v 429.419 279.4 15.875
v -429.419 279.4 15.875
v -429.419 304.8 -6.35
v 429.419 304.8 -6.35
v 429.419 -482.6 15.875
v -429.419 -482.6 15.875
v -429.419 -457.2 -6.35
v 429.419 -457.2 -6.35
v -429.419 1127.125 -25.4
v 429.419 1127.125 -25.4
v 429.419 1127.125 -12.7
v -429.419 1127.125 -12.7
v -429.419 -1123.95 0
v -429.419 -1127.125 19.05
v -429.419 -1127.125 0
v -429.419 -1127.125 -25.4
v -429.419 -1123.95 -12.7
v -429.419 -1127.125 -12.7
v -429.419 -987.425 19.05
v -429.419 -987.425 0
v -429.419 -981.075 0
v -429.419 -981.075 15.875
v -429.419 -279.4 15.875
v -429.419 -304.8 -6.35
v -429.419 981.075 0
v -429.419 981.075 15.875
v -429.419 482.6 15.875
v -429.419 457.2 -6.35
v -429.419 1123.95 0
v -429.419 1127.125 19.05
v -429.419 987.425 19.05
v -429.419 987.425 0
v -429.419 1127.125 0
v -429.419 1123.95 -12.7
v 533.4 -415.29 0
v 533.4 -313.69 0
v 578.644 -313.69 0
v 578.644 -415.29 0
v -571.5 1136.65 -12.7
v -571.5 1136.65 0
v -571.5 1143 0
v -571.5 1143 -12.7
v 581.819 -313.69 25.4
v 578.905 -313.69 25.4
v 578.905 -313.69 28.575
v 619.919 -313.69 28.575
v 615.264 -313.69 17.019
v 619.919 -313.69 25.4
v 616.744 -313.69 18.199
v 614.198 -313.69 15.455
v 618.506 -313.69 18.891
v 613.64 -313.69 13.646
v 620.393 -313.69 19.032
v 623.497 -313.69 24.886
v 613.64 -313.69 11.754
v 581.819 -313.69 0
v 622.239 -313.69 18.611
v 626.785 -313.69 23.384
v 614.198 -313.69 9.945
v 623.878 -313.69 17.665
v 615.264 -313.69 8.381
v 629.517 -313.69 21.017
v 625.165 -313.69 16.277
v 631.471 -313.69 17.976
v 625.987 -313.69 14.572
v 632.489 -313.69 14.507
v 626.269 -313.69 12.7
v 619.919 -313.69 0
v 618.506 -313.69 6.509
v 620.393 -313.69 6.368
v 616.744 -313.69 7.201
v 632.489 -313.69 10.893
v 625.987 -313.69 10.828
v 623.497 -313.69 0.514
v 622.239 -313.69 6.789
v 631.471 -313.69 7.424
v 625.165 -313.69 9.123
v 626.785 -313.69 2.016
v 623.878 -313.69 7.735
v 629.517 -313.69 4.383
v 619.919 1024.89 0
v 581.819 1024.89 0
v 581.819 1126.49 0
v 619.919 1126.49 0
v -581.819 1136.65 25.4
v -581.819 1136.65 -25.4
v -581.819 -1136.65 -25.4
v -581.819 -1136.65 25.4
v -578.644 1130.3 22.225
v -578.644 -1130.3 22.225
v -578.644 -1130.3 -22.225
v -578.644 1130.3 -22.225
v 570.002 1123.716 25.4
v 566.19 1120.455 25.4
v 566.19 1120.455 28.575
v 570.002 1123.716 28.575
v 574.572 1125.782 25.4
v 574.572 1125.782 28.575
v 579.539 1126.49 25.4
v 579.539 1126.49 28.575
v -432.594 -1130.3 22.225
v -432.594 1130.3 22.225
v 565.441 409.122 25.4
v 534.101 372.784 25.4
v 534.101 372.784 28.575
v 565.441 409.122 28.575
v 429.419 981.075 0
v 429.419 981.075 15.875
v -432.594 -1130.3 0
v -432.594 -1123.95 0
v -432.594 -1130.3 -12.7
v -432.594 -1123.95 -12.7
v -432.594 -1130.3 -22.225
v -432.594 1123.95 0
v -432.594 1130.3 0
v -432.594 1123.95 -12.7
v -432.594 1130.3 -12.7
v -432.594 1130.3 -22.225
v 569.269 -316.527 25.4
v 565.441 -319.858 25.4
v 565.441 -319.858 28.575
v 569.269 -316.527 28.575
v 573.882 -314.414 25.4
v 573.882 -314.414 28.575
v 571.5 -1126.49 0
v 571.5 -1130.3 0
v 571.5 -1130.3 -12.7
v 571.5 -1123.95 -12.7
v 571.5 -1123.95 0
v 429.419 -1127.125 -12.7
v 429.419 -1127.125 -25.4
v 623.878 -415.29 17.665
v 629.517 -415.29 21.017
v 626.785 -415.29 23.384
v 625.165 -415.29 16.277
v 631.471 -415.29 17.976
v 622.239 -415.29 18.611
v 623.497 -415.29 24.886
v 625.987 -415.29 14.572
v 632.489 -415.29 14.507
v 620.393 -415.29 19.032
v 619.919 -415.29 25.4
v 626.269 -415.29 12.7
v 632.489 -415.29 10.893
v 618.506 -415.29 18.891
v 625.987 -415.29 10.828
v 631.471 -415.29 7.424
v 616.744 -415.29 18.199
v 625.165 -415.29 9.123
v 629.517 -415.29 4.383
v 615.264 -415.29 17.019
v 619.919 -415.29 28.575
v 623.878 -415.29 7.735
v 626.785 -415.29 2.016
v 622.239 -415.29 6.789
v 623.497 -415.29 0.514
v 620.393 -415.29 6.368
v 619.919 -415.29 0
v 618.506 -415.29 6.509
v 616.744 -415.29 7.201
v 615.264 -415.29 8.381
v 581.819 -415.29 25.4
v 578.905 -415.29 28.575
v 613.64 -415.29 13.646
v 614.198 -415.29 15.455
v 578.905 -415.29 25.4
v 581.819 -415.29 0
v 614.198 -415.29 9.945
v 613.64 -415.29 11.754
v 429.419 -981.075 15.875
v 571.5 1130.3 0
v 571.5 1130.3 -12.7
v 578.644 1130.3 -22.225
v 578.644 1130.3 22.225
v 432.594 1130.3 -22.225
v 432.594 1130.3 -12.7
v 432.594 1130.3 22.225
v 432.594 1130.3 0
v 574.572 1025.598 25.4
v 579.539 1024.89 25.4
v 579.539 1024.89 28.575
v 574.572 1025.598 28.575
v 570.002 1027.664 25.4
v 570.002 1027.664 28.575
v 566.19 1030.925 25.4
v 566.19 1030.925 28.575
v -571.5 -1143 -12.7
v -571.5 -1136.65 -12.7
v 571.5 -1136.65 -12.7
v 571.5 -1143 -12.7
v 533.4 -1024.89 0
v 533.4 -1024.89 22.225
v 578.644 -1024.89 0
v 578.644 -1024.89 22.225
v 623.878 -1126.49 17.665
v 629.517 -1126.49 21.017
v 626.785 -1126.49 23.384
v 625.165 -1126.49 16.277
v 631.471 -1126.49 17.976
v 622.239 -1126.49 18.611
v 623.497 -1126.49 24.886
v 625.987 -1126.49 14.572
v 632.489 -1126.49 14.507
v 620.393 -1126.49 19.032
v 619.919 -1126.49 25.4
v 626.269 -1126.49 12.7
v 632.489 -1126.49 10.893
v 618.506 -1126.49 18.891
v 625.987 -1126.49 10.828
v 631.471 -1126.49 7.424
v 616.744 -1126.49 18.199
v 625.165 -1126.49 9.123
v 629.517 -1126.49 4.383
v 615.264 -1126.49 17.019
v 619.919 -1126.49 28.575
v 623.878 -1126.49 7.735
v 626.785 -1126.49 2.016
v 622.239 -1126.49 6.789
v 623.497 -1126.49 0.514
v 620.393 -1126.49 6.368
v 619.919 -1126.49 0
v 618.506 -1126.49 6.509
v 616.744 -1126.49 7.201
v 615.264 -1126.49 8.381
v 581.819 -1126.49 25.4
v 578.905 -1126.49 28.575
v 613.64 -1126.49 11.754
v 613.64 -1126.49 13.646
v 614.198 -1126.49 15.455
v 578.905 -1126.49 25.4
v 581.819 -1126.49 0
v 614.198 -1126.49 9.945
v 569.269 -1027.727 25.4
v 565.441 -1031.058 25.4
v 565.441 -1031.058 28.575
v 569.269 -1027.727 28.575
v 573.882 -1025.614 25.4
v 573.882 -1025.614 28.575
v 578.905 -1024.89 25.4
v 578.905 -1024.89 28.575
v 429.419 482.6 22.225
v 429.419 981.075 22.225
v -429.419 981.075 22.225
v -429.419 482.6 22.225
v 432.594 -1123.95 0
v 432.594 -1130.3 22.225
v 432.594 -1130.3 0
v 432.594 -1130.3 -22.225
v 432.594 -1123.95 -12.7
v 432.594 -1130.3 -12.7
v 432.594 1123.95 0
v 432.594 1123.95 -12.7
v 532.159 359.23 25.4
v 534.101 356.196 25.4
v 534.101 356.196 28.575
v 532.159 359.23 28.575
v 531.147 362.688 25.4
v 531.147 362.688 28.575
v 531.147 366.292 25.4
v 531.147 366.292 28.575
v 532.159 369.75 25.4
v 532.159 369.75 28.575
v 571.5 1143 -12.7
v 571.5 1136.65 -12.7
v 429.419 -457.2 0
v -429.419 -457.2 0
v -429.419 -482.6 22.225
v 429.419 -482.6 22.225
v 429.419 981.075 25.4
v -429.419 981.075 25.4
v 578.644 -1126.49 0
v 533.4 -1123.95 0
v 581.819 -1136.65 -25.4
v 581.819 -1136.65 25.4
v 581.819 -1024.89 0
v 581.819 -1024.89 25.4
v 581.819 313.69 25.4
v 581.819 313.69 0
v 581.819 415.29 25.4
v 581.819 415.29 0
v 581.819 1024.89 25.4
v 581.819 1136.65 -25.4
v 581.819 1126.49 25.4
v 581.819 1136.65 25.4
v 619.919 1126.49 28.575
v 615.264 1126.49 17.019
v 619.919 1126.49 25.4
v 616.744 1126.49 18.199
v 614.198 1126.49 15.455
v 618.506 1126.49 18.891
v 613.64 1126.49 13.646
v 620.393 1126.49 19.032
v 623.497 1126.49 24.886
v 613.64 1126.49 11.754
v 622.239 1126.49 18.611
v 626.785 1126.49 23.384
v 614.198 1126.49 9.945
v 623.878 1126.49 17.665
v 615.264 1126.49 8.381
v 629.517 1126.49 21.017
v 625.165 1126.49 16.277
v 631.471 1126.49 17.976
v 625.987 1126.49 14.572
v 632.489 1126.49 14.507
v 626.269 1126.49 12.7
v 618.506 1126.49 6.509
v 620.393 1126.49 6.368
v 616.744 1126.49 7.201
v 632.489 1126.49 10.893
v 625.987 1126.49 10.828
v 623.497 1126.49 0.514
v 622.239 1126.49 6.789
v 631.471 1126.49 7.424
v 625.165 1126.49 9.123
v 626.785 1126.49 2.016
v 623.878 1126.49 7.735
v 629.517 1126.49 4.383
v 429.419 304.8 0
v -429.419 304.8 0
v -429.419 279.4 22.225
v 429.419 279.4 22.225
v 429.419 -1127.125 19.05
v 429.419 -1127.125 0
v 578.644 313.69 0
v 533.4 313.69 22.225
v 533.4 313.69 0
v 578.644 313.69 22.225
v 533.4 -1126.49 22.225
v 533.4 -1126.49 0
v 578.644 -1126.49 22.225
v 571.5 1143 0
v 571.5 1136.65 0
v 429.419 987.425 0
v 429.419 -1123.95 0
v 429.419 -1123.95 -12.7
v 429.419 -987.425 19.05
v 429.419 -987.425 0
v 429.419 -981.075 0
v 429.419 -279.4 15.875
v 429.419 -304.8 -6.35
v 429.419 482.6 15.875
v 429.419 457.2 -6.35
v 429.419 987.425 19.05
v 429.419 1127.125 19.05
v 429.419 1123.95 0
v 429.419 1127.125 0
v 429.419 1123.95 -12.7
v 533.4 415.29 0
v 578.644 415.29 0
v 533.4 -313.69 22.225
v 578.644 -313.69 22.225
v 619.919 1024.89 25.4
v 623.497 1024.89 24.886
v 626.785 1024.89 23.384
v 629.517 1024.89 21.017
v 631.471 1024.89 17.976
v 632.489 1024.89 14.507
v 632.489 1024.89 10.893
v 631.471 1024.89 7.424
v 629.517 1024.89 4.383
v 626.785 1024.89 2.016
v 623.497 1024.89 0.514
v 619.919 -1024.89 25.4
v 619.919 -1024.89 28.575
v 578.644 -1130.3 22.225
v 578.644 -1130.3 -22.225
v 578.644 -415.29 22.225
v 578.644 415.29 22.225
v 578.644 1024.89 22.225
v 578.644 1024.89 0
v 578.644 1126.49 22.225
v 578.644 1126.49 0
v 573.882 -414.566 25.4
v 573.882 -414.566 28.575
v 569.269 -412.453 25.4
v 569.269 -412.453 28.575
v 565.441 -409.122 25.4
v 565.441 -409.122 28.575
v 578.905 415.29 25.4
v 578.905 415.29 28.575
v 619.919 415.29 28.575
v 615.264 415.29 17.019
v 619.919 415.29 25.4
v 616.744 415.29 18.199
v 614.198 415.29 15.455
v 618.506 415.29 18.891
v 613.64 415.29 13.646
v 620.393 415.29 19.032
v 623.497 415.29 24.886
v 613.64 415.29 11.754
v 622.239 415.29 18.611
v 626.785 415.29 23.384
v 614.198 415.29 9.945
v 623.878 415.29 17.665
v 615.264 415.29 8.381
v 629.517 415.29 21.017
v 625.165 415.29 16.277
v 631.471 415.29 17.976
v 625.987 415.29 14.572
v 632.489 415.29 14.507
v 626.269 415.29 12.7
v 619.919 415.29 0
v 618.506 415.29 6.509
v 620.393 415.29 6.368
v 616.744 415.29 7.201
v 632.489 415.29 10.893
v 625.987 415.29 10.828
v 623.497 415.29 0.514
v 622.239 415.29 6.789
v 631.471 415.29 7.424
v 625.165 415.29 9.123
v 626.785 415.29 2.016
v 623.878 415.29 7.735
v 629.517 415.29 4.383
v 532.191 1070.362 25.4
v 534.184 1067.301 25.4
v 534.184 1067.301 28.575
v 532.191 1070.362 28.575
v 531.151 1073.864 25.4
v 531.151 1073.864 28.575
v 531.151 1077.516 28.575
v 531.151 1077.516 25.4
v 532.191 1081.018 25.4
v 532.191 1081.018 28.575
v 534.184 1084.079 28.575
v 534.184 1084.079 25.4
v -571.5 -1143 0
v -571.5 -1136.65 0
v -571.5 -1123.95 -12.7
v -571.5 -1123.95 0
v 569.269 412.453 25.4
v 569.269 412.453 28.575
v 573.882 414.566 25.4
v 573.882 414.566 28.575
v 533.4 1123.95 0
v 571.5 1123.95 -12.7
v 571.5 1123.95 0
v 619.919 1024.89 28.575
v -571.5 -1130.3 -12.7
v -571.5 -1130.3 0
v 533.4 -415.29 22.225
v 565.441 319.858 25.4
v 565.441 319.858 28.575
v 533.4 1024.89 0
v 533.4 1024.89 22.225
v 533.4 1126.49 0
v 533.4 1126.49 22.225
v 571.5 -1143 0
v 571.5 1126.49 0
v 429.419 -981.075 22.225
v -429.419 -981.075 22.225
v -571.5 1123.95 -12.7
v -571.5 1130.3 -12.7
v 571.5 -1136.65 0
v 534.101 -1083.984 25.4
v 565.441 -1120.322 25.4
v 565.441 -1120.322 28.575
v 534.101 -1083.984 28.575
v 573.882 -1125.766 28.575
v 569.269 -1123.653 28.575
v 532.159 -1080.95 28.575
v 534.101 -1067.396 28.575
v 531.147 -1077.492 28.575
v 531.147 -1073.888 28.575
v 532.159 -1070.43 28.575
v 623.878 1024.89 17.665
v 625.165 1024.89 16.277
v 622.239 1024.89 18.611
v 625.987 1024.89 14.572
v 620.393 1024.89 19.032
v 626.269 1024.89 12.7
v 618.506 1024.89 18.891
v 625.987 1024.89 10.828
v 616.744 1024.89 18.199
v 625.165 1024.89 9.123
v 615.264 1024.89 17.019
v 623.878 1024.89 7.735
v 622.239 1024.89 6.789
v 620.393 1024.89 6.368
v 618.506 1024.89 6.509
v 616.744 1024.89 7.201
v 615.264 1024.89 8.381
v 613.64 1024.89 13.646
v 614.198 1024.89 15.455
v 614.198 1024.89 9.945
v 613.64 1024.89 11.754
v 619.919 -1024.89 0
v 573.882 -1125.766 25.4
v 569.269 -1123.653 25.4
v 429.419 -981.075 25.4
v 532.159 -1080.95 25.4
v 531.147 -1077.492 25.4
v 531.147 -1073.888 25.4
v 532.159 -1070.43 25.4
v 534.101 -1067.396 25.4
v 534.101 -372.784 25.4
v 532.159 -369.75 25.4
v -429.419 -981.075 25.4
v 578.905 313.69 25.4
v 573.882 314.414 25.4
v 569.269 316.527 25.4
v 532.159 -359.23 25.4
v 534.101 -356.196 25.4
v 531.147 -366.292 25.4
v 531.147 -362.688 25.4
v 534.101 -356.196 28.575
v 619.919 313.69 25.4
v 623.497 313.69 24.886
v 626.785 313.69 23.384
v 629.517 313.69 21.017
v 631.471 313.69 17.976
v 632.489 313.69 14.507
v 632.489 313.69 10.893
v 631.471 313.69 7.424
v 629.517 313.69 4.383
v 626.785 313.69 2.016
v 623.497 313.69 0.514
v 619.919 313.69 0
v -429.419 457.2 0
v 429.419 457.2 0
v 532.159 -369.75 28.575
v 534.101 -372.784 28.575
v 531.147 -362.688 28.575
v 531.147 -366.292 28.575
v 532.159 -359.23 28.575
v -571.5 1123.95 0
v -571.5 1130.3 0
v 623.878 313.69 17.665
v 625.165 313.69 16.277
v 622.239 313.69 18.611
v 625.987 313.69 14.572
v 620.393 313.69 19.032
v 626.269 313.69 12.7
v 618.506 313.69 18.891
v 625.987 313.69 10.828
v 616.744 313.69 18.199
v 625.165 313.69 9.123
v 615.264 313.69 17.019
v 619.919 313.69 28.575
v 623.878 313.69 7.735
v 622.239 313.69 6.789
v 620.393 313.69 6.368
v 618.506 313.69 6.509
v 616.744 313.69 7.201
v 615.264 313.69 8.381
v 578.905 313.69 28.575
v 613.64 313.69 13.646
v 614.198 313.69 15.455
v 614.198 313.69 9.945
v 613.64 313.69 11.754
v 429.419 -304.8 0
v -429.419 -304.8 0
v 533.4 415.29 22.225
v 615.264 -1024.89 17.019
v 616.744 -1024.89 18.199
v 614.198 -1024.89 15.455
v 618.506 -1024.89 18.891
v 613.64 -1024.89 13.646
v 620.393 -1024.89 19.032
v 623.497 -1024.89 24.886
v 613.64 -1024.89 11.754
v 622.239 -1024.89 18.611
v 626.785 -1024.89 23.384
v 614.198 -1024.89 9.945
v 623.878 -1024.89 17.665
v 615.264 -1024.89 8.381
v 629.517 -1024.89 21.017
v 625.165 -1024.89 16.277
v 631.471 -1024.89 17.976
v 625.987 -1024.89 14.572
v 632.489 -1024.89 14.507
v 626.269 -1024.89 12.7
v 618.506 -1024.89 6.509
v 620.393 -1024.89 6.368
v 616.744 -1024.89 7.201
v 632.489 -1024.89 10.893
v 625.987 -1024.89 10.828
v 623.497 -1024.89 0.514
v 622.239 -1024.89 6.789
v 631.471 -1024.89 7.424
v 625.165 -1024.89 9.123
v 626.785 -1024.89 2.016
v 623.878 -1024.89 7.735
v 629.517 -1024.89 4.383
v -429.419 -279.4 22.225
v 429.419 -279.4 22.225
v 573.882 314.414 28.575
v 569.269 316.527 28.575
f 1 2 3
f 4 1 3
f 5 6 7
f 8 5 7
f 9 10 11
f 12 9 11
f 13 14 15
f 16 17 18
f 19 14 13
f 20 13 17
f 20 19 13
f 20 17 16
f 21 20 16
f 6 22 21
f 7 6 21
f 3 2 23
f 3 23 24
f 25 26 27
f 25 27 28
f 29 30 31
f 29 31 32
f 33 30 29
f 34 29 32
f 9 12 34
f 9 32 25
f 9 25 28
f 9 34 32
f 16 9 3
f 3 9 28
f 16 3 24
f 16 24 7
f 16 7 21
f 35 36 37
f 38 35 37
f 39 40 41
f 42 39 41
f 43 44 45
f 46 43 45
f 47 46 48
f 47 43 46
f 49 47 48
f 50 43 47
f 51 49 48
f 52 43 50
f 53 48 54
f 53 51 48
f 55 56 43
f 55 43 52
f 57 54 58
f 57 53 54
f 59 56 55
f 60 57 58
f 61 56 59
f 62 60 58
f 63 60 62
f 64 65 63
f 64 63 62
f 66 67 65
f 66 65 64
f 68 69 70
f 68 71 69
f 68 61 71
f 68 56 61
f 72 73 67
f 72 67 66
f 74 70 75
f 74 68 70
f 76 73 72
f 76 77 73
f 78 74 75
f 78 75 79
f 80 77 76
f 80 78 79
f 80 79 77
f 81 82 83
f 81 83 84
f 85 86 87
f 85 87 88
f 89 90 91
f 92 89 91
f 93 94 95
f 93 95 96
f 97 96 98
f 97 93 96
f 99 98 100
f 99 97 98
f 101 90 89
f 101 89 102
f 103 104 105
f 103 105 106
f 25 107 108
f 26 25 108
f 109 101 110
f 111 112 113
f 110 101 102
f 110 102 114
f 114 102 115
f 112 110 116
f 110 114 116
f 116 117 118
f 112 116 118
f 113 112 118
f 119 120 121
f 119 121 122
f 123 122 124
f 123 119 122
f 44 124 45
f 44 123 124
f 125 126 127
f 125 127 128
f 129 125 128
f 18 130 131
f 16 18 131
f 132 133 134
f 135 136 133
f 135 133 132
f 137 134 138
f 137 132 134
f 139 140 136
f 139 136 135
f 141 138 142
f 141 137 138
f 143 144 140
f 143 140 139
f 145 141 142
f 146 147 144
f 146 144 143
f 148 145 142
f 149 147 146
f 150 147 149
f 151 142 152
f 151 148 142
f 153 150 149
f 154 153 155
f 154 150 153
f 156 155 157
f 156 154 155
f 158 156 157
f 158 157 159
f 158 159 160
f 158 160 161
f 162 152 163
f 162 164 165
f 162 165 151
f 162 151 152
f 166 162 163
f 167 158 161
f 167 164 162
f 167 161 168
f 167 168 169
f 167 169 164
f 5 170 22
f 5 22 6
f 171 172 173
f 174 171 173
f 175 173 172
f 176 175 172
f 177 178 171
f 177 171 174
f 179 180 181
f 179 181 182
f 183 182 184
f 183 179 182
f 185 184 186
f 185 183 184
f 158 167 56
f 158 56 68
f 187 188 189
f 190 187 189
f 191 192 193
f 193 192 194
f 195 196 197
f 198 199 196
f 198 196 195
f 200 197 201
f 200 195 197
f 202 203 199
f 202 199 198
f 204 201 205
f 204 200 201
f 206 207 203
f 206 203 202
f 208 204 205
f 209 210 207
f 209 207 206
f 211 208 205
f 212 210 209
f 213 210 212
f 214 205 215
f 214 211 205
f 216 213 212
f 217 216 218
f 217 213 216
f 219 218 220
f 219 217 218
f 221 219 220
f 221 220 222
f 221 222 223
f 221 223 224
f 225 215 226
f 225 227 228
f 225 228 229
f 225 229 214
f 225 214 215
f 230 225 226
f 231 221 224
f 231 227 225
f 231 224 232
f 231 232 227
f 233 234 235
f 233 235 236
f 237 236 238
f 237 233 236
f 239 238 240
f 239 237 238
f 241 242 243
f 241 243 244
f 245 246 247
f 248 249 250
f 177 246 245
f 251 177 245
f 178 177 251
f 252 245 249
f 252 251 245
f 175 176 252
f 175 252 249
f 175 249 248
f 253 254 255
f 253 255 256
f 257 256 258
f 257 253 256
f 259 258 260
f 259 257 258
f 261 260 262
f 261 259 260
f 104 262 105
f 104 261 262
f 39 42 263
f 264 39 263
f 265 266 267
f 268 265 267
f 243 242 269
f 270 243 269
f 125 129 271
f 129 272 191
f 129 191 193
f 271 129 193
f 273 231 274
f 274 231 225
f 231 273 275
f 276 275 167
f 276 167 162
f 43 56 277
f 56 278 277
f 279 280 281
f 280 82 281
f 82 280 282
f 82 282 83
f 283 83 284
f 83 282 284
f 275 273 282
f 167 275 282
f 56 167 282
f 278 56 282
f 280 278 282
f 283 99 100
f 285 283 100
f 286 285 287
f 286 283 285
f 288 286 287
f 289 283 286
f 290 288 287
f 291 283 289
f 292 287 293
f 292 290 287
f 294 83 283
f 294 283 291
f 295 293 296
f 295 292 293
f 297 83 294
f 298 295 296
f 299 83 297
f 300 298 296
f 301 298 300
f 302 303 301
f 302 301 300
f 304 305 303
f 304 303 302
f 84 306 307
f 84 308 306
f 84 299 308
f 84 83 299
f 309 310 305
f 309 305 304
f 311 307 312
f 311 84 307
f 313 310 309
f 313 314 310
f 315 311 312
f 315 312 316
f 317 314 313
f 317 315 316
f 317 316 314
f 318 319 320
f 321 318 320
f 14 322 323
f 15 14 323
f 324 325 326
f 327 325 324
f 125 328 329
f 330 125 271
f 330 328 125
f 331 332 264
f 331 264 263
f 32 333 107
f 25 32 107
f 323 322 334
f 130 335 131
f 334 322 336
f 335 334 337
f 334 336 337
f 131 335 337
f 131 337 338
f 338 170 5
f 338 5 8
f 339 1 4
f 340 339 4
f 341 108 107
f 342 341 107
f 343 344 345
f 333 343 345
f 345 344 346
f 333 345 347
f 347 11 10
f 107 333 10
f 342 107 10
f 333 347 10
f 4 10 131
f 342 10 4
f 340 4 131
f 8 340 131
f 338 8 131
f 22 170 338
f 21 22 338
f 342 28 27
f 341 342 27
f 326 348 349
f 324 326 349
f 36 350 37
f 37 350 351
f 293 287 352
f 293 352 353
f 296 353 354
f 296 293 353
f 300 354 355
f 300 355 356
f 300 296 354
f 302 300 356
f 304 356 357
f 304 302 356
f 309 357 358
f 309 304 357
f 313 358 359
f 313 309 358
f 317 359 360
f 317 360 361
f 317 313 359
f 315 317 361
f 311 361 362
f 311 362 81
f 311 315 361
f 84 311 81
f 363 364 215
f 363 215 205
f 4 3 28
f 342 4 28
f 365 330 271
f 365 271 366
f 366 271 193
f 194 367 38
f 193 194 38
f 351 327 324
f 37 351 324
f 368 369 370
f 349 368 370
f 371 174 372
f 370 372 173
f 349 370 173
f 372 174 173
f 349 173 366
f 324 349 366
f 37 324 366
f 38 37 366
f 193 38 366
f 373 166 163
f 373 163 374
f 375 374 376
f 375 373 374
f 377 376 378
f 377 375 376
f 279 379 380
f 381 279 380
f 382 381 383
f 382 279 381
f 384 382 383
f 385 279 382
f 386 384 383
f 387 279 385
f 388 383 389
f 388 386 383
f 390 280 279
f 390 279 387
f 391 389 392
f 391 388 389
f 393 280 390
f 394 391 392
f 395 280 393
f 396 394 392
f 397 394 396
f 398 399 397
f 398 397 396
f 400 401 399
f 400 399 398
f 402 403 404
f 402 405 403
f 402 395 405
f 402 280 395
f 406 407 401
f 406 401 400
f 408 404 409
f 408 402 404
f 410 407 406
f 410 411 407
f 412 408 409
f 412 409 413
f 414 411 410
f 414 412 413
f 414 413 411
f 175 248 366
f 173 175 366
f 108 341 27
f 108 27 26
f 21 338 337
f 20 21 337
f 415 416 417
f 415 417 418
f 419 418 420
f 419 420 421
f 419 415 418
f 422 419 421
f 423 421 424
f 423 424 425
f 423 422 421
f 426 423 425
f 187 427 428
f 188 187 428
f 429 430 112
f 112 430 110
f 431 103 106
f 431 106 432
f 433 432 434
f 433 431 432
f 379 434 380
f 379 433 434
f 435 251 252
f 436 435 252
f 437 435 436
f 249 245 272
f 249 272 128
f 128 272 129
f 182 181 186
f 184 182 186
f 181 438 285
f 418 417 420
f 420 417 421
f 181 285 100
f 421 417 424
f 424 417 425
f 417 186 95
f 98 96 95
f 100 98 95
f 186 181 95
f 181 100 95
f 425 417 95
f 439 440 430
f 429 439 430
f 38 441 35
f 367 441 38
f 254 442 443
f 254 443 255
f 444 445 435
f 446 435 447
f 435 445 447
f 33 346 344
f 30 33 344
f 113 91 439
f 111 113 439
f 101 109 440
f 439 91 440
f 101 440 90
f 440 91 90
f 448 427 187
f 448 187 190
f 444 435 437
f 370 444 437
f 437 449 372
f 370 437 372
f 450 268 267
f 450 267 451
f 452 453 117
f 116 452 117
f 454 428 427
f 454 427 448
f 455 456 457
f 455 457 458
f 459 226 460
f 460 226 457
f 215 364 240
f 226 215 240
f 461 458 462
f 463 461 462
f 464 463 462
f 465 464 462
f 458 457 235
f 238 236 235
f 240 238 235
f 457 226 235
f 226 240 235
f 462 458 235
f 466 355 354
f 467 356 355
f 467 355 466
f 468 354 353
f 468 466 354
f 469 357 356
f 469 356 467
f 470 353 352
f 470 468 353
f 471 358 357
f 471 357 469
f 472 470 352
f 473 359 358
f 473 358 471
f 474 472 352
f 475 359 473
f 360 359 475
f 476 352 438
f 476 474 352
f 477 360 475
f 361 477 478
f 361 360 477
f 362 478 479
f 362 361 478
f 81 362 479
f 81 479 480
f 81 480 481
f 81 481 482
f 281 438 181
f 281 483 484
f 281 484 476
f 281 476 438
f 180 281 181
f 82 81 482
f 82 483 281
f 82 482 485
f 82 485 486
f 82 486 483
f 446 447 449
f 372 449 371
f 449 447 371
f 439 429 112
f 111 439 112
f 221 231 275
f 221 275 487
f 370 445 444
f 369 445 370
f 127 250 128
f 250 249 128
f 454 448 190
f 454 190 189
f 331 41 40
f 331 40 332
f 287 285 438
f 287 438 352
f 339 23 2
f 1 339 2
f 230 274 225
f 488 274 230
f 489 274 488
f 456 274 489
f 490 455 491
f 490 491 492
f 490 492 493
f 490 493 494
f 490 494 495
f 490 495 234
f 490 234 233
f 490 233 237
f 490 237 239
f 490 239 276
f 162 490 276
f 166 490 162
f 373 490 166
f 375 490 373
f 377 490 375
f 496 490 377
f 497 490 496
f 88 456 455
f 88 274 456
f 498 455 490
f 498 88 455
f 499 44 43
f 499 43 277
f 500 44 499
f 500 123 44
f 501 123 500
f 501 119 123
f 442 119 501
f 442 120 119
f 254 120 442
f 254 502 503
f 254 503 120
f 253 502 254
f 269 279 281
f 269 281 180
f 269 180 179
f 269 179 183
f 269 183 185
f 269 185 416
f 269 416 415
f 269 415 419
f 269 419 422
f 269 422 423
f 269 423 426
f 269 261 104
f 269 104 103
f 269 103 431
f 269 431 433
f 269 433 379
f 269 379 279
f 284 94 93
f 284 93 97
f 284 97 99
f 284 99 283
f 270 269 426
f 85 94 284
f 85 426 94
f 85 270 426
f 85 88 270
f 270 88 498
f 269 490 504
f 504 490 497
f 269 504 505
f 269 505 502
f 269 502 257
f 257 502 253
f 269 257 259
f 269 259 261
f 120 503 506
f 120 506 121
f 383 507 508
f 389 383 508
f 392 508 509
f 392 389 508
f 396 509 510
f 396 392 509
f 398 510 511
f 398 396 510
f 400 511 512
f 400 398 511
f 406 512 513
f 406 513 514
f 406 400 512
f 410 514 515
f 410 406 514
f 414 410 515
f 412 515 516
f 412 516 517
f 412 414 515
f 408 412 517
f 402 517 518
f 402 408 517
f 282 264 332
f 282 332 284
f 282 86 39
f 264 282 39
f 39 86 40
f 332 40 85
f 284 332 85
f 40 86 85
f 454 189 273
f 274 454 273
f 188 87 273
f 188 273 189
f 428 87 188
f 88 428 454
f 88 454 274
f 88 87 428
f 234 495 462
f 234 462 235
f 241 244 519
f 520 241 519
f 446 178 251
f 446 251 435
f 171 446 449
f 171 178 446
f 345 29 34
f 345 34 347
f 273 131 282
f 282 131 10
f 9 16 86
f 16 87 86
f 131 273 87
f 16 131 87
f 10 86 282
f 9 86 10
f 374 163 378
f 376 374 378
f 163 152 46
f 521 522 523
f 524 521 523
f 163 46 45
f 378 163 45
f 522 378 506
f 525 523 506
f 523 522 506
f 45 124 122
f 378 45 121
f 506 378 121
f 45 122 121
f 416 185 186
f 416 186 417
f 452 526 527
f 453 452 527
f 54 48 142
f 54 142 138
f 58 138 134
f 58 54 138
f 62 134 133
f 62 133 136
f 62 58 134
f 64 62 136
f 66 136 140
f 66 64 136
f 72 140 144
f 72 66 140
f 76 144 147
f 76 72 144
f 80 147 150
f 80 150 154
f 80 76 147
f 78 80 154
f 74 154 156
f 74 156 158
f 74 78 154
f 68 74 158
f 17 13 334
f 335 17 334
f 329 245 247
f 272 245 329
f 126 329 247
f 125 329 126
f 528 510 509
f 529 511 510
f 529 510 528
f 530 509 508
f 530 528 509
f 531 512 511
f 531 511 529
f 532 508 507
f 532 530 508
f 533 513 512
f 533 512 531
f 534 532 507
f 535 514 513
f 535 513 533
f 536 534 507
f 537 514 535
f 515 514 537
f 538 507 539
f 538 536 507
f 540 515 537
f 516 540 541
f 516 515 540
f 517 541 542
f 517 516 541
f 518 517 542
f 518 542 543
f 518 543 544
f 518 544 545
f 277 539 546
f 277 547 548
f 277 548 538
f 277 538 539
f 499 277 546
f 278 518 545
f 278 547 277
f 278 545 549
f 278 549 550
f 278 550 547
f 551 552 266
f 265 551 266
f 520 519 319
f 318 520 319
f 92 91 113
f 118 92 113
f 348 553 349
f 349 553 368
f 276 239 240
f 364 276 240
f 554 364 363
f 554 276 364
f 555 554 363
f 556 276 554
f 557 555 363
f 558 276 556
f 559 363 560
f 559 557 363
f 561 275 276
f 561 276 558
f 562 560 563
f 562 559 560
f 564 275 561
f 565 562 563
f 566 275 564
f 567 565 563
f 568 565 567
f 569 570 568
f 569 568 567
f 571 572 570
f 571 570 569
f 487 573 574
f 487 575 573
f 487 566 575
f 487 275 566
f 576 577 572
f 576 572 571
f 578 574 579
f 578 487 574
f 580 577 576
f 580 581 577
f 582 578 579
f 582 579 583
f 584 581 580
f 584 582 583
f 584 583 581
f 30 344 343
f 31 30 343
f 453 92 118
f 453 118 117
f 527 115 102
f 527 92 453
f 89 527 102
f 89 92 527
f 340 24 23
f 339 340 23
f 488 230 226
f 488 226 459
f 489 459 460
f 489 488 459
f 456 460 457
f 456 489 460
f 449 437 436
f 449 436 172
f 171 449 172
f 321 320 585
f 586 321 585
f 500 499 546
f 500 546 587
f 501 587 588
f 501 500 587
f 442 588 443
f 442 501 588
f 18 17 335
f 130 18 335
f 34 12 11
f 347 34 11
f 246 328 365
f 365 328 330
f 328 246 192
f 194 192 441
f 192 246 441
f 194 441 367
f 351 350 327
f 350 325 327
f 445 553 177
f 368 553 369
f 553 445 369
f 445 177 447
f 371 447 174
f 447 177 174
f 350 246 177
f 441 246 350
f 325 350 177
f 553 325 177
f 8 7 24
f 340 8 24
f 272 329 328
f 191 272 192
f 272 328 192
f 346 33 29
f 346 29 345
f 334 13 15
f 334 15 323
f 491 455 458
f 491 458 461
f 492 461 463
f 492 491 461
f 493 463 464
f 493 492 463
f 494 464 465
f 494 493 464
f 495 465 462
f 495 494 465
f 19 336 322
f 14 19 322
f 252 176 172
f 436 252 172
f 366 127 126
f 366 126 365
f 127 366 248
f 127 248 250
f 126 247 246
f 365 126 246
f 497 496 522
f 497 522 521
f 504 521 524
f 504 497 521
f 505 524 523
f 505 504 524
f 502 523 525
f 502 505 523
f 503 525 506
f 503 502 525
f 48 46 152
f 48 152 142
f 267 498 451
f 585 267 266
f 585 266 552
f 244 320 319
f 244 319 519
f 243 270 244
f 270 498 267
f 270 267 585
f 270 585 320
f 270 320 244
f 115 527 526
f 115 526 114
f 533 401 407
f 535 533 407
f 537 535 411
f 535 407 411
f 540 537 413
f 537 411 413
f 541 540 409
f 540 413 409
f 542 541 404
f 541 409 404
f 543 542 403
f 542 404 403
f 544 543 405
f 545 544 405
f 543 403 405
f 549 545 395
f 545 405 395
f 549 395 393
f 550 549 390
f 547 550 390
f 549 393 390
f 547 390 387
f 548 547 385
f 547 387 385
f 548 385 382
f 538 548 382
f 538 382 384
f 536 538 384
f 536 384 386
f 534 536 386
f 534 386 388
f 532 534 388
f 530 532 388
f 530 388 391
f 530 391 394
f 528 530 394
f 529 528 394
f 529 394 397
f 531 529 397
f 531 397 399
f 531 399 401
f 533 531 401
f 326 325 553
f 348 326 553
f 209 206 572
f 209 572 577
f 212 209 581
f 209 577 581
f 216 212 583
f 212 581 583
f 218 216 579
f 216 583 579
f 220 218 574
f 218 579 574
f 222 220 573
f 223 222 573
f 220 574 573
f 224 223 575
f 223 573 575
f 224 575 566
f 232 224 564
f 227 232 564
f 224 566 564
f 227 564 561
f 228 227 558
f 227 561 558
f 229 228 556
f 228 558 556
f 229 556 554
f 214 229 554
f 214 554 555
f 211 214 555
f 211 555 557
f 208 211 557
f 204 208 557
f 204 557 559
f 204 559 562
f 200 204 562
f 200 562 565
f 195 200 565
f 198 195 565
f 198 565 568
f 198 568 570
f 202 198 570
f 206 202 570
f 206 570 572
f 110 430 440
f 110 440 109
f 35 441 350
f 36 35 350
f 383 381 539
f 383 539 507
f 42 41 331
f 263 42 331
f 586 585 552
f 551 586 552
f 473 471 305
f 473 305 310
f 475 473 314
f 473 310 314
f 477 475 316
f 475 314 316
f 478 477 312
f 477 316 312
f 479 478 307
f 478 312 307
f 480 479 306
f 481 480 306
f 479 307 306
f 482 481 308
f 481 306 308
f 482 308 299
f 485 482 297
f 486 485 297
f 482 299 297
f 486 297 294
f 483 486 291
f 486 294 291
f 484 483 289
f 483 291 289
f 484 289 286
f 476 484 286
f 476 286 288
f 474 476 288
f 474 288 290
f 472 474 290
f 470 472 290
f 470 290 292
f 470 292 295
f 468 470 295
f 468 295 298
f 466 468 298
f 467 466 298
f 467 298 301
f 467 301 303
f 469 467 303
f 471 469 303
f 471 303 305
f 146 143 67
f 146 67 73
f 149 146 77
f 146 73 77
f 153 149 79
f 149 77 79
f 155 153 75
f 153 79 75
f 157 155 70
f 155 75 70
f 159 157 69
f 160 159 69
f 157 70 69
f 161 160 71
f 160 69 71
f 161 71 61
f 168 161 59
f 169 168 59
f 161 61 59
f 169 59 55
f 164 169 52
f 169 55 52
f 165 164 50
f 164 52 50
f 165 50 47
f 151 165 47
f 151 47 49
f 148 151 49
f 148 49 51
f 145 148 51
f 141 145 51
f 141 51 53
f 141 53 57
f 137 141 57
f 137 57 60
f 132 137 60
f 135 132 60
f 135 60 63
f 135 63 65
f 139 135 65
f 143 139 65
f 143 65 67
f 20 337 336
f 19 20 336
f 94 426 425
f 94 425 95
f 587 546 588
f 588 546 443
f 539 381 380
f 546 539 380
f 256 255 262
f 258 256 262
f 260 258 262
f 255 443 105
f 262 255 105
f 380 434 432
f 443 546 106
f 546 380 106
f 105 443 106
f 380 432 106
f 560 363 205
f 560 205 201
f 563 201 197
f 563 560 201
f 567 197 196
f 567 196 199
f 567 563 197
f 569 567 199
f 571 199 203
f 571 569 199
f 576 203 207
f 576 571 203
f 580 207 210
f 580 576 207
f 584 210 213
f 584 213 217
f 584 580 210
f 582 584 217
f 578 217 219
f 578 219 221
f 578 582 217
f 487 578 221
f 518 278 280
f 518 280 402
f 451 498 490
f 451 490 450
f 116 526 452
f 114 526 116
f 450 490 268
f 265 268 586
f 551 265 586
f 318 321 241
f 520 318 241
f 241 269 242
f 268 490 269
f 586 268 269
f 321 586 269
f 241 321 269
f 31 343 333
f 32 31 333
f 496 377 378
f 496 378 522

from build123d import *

# Parameters (mm, degrees)
SKETCH2_W             = 152.4
SKETCH2_H             = 50.8
SKETCH2_W_2           = 146.05
SKETCH2_H_2           = 44.45
BOSS_EXTRUDE1_DEPTH   = 1133.475
BOSS_EXTRUDE1_2_DEPTH = 1133.475
BOSS_EXTRUDE4_DEPTH   = 858.8375
SKETCH5_W             = 50.8
SKETCH5_H             = 6.35
BOSS_EXTRUDE5_DEPTH   = 1163.6375
BOSS_EXTRUDE6_DEPTH   = 858.8375
SKETCH7_W             = 101.6
SKETCH7_H             = 101.6
BOSS_EXTRUDE7_DEPTH   = 25.4
SKETCH1_W             = 1143
SKETCH1_H             = 19.05
BOSS_EXTRUDE8_DEPTH   = 12.7
BOSS_EXTRUDE9_DEPTH   = 3.175
SKETCH8_R             = 6.35
CUT_EXTRUDE1_DEPTH    = 2252.98


with BuildPart() as part:
    # Sketch2 → Boss-Extrude1 (new body, symmetric)
    with BuildSketch(Plane(origin=(0, 0, 0), x_dir=(1, 0, 0), z_dir=(0, 1, 0))):
        with Locations((-505.61875, 0)):
            Rectangle(SKETCH2_W, SKETCH2_H)
        with Locations((-505.61875, 0)):
            Rectangle(SKETCH2_W_2, SKETCH2_H_2, mode=Mode.SUBTRACT)
    extrude(amount=BOSS_EXTRUDE1_DEPTH, both=True)



with BuildPart() as body_2:
    # Sketch2 → Boss-Extrude1 2 (new body, symmetric)
    with BuildSketch(Plane(origin=(0, 0, 0), x_dir=(1, 0, 0), z_dir=(0, 1, 0))):
        with Locations((505.61875, 0)):
            Rectangle(SKETCH2_W, SKETCH2_H)
        with Locations((505.61875, 0)):
            Rectangle(SKETCH2_W_2, SKETCH2_H_2, mode=Mode.SUBTRACT)
    extrude(amount=BOSS_EXTRUDE1_2_DEPTH, both=True)


with BuildPart() as part_1:
    add(part.part)

    add(body_2.part)  # Boss-Extrude4 merges body 2
    # Sketch3 → Boss-Extrude4 (add)
    with BuildSketch(Plane.ZY.offset(-429.41875)):
        Polygon((19.05, 987.425), (0, 987.425), (0, 981.075), (25.4, 981.075), (25.4, 1133.475), (-25.4, 1133.475), (-25.4, 1127.125), (19.05, 1127.125), align=None)
        Polygon((-25.4, -1133.475), (25.4, -1133.475), (25.4, -981.075), (0, -981.075), (0, -987.425), (19.05, -987.425), (19.05, -1127.125), (-25.4, -1127.125), align=None)
    extrude(amount=BOSS_EXTRUDE4_DEPTH)

    # Sketch5 → Boss-Extrude5 (add)
    with BuildSketch(Plane.ZY.offset(581.81875)):
        with Locations((0, -1133.475)):
            Rectangle(SKETCH5_W, SKETCH5_H)
        with Locations((0, 1133.475)):
            Rectangle(SKETCH5_W, SKETCH5_H)
    extrude(amount=-BOSS_EXTRUDE5_DEPTH)

    # Sketch6 → Boss-Extrude6 (add)
    with BuildSketch(Plane(origin=(-429.41875, 0, 0), x_dir=(0, 0, -1), z_dir=(1, 0, 0))):
        Polygon((-15.875, -981.075), (-15.875, -482.6), (6.35, -457.2), (6.35, -304.8), (-15.875, -279.4), (-15.875, 279.4), (6.35, 304.8), (6.35, 457.2), (-15.875, 482.6), (-15.875, 981.075), (-22.225, 981.075), (-22.225, 482.6), (0, 457.2), (0, 304.8), (-22.225, 279.4), (-22.225, -279.4), (0, -304.8), (0, -457.2), (-22.225, -482.6), (-22.225, -981.075), align=None)
    extrude(amount=BOSS_EXTRUDE6_DEPTH)

    # Sketch7 → Boss-Extrude7 (add)
    with BuildSketch(Plane.XY.offset(25.4)):
        with Locations((584.2, 1075.69)):
            Rectangle(SKETCH7_W, SKETCH7_H)
        with Locations((584.2, 364.49)):
            Rectangle(SKETCH7_W, SKETCH7_H)
        with Locations((584.2, -364.49)):
            Rectangle(SKETCH7_W, SKETCH7_H)
        with Locations((584.2, -1075.69)):
            Rectangle(SKETCH7_W, SKETCH7_H)
    extrude(amount=-BOSS_EXTRUDE7_DEPTH)

    # Sketch1 → Boss-Extrude8 (add)
    with BuildSketch(Plane.XY):
        with Locations((0, -1133.475)):
            Rectangle(SKETCH1_W, SKETCH1_H)
        with Locations((0, 1133.475)):
            Rectangle(SKETCH1_W, SKETCH1_H)
    extrude(amount=-BOSS_EXTRUDE8_DEPTH)

    # Sketch9 → Boss-Extrude9 (add)
    with BuildSketch(Plane.XY.offset(25.4)):
        with BuildLine():
            Line((635, 1126.49), (635, 1024.89))
            Line((635, 1024.89), (579.538518777, 1024.89))
            ThreePointArc((579.538518777, 1024.89), (572.213815984, 1026.468854084), (566.189972237, 1030.925013611))
            Line((566.189972237, 1030.925013611), (534.1840739, 1067.300724008))
            ThreePointArc((534.1840739, 1067.300724008), (531.01875, 1075.69), (534.1840739, 1084.079275992))
            Line((534.1840739, 1084.079275992), (566.189972237, 1120.454986389))
            ThreePointArc((566.189972237, 1120.454986389), (572.213815984, 1124.911145916), (579.538518777, 1126.49))
            Line((579.538518777, 1126.49), (635, 1126.49))
        make_face()
        with BuildLine():
            Line((635, 415.29), (635, 313.69))
            Line((635, 313.69), (578.904878784, 313.69))
            ThreePointArc((578.904878784, 313.69), (571.5, 315.30534194), (565.440611797, 319.857854871))
            Line((565.440611797, 319.857854871), (534.101416438, 356.195610622))
            ThreePointArc((534.101416438, 356.195610622), (531.01875, 364.49), (534.101416438, 372.784389378))
            Line((534.101416438, 372.784389378), (565.440611797, 409.122145129))
            ThreePointArc((565.440611797, 409.122145129), (571.5, 413.67465806), (578.904878784, 415.29))
            Line((578.904878784, 415.29), (635, 415.29))
        make_face()
        with BuildLine():
            Line((635, -313.69), (635, -415.29))
            Line((635, -415.29), (578.904878784, -415.29))
            ThreePointArc((578.904878784, -415.29), (571.5, -413.67465806), (565.440611797, -409.122145129))
            Line((565.440611797, -409.122145129), (534.101416438, -372.784389378))
            ThreePointArc((534.101416438, -372.784389378), (531.01875, -364.49), (534.101416438, -356.195610622))
            Line((534.101416438, -356.195610622), (565.440611797, -319.857854871))
            ThreePointArc((565.440611797, -319.857854871), (571.5, -315.30534194), (578.904878784, -313.69))
            Line((578.904878784, -313.69), (635, -313.69))
        make_face()
        with BuildLine():
            Line((635, -1024.89), (635, -1126.49))
            Line((635, -1126.49), (578.904878784, -1126.49))
            ThreePointArc((578.904878784, -1126.49), (571.5, -1124.87465806), (565.440611797, -1120.322145129))
            Line((565.440611797, -1120.322145129), (534.101416438, -1083.984389378))
            ThreePointArc((534.101416438, -1083.984389378), (531.01875, -1075.69), (534.101416438, -1067.395610622))
            Line((534.101416438, -1067.395610622), (565.440611797, -1031.057854871))
            ThreePointArc((565.440611797, -1031.057854871), (571.5, -1026.50534194), (578.904878784, -1024.89))
            Line((578.904878784, -1024.89), (635, -1024.89))
        make_face()
    extrude(amount=BOSS_EXTRUDE9_DEPTH)

    # Sketch8 → Cut-Extrude1 (cut)
    with BuildSketch(Plane(origin=(0, 1126.49, 0), x_dir=(1, 0, 0), z_dir=(0, 1, 0))):
        with Locations((619.91875, -12.7)):
            Circle(SKETCH8_R)
        with BuildLine():
            Line((619.91875, 0), (635, 0))
            Line((635, 0), (635, -28.575))
            Line((635, -28.575), (619.91875, -28.575))
            Line((619.91875, -28.575), (619.91875, -25.4))
            ThreePointArc((619.91875, -25.4), (632.61875, -12.7), (619.91875, 0))
        make_face()
    extrude(amount=-CUT_EXTRUDE1_DEPTH, mode=Mode.SUBTRACT)


solid = part_1.part
